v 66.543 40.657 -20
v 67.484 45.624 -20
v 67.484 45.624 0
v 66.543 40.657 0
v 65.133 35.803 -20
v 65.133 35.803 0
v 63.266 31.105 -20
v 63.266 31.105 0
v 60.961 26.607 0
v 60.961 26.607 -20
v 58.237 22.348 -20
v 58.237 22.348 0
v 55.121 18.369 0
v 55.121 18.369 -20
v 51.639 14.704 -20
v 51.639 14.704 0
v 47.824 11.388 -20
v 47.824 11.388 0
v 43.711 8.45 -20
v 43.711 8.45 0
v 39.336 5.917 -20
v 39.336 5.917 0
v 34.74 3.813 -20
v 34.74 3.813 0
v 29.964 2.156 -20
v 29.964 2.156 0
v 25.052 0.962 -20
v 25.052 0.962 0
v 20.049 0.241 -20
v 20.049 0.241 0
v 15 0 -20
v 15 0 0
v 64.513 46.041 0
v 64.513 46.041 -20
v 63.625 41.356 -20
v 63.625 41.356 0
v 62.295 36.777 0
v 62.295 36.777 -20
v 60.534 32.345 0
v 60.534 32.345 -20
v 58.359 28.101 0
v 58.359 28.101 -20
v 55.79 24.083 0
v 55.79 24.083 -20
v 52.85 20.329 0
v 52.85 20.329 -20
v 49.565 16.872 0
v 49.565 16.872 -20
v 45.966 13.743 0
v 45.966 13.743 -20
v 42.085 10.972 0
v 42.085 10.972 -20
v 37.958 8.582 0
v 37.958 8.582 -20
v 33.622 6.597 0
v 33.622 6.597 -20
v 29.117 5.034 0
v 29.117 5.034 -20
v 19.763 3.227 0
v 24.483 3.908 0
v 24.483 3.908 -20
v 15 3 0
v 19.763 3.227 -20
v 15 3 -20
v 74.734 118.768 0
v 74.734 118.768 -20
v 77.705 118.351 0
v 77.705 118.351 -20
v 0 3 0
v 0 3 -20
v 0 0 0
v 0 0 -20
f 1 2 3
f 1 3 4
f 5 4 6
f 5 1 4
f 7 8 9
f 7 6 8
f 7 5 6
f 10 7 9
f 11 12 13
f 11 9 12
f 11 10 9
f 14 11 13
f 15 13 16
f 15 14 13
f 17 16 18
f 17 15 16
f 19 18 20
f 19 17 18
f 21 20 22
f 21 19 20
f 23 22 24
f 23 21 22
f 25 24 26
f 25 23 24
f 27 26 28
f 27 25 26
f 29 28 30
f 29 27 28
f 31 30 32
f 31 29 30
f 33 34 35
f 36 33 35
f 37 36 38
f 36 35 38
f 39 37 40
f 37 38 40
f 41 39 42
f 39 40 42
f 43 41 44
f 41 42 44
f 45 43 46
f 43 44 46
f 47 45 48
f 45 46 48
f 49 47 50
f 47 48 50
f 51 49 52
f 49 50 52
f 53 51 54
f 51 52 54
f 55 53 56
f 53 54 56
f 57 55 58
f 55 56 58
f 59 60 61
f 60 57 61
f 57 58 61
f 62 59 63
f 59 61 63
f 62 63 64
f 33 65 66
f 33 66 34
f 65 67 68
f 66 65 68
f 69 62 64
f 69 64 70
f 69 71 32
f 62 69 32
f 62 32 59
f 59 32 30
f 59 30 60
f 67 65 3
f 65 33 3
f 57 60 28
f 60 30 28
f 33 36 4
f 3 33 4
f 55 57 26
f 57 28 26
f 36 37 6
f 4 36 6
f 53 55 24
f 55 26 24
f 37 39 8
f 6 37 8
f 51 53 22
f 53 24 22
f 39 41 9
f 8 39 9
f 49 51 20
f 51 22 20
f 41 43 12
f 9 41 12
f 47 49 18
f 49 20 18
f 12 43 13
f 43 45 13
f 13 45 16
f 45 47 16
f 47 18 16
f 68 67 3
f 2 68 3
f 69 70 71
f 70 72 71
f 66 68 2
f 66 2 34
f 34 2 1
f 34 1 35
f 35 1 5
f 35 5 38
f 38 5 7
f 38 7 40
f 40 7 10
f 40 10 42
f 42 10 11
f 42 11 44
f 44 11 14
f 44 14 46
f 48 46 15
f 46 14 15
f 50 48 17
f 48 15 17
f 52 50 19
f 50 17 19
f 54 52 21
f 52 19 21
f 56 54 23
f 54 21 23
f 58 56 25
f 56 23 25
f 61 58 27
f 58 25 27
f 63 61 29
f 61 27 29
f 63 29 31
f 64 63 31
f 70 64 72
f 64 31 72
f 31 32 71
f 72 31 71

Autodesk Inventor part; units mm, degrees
ref_plane "YZ Plane" through (0, 0, 0) normal (1, 0, 0) x (0, 1, 0)
ref_plane "XZ Plane" through (0, 0, 0) normal (0, 1, 0) x (-1, 0, 0)
ref_plane "XY Plane" through (0, 0, 0) normal (0, 0, 1) x (1, 0, 0)
sketch "Sketch2" plane through (0, 0, 0) normal (0, 1, 0) x (-1, 0, 0)
  line L0 (0, 0) -> (-160, 0)
  line L1 (-160, 0) -> (-160, -20)
  line L2 (-160, -20) -> (0, -20)
  line L3 (0, -20) -> (0, 0)
  dimension "d0" = 160
  dimension "d1" = 20
extrude "Extrusion1" add sketch "Sketch2" along normal blind 3
sketch "Sketch3" plane through (0, 3, 0) normal (0, 1, 0) x (1, 0, 0)
  line L0 (160, 20) -> (0, 20) projected
  line L1 (160, 0) -> (160, 20) projected
  line L2 (160, 20) -> (160, 0)
  line L3 (15, 20) -> (15, 0)
  line L4 (0, 0) -> (160, 0) projected
  line L5 (0, 20) -> (0, 0) projected
  dimension "d8" = 15
bend part "Bend Part1" radius 50 angle 82 line through (15, 3, -20) along (0, 0, 1) centre toward (0, 1, 0) moving side (1, 0, 0) both sides no
properties part number "ball-reload-left"
